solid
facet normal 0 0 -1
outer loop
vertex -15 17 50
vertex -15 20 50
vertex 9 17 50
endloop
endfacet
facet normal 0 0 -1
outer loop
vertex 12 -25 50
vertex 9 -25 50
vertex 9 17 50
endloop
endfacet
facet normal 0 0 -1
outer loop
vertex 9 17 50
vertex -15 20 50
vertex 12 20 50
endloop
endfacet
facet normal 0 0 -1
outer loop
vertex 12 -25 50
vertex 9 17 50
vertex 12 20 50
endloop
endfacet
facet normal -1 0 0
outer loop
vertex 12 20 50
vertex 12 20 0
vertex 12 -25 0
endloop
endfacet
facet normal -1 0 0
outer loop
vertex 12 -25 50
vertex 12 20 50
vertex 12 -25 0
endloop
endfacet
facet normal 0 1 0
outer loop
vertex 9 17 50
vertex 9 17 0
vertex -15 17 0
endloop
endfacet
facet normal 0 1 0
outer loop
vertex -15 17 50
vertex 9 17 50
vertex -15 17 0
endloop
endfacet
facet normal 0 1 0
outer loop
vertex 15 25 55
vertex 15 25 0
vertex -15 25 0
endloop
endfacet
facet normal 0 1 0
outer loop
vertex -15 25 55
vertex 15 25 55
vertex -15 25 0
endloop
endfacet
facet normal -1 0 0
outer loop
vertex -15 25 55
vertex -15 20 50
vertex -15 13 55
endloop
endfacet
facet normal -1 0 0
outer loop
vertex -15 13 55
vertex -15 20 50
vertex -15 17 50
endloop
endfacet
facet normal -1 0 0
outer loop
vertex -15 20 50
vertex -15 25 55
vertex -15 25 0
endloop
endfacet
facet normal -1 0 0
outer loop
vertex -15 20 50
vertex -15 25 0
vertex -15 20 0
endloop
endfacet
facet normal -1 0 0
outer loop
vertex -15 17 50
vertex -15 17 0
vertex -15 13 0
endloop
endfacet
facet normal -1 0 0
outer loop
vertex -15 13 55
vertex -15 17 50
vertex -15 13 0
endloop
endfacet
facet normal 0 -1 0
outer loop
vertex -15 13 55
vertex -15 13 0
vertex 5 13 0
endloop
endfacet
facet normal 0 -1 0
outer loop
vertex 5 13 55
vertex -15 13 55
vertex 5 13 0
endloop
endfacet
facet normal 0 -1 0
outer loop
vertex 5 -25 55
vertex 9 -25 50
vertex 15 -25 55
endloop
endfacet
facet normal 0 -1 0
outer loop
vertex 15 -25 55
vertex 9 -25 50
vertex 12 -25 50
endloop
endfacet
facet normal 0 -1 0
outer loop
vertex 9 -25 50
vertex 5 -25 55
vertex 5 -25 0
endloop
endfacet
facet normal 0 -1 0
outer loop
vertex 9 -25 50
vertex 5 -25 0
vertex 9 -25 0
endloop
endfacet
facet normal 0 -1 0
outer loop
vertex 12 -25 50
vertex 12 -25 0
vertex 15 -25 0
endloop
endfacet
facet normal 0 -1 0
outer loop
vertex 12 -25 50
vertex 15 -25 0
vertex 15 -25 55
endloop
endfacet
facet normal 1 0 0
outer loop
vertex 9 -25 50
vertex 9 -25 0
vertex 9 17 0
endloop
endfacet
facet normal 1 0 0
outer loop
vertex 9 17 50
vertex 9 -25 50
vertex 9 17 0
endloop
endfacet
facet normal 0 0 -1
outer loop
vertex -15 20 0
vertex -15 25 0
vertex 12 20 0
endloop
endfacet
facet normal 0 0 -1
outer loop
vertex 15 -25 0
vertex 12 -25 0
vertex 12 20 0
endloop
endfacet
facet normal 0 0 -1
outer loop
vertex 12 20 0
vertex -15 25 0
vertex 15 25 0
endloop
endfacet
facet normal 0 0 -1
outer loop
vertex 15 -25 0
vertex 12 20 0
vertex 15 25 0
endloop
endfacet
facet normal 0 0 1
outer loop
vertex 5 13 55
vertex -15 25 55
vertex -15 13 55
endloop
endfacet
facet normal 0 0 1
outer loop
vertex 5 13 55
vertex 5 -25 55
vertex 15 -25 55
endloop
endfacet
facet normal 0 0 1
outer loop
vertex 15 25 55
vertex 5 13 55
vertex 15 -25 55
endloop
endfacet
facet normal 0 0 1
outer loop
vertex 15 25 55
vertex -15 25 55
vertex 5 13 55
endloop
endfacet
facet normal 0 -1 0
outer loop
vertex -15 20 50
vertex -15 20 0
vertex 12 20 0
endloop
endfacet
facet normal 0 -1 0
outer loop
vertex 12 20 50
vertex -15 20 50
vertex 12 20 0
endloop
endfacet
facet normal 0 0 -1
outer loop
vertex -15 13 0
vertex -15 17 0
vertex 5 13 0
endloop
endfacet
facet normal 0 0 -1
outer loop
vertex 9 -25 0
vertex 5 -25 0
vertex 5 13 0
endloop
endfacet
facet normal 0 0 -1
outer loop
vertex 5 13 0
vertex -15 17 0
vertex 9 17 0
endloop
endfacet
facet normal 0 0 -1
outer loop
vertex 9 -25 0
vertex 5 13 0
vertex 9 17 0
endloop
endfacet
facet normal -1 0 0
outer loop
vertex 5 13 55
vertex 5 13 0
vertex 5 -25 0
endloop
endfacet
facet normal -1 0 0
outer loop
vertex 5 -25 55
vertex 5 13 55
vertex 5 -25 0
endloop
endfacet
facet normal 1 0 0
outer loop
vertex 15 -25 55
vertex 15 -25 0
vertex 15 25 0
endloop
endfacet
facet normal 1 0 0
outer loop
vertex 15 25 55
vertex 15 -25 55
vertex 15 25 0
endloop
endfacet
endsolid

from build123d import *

# Parameters (mm, degrees)
BOSS_EXTRUDE1_DEPTH   = 55
BOSS_EXTRUDE1_2_DEPTH = 55
SKETCH2_W             = 4
SKETCH2_H             = 38
SKETCH2_W_2           = 6
BOSS_EXTRUDE2_DEPTH   = 5


with BuildPart() as part:
    # Sketch1 → Boss-Extrude1 (new body)
    with BuildSketch(Plane.XY):
        Polygon((9, 17), (-15, 17), (-15, 13), (5, 13), (5, -25), (9, -25), align=None)
    extrude(amount=BOSS_EXTRUDE1_DEPTH)



with BuildPart() as body_2:
    # Sketch1 → Boss-Extrude1 2 (new body)
    with BuildSketch(Plane.XY):
        Polygon((-15, 25), (-15, 20), (12, 20), (12, -25), (15, -25), (15, 25), align=None)
    extrude(amount=BOSS_EXTRUDE1_2_DEPTH)


with BuildPart() as part_1:
    add(part.part)

    add(body_2.part)  # Boss-Extrude2 merges body 2
    # Sketch2 → Boss-Extrude2 (add)
    with BuildSketch(Plane.XY.offset(55)):
        Polygon((-15, 25), (-15, 17), (9, 17), (9, 13), (15, 13), (15, 25), align=None)
        Polygon((-15, 17), (-15, 13), (5, 13), (9, 13), (9, 17), align=None)
        with Locations((7, -6)):
            Rectangle(SKETCH2_W, SKETCH2_H)
        with Locations((12, -6)):
            Rectangle(SKETCH2_W_2, SKETCH2_H)
    extrude(amount=-BOSS_EXTRUDE2_DEPTH)


solid = part_1.part
